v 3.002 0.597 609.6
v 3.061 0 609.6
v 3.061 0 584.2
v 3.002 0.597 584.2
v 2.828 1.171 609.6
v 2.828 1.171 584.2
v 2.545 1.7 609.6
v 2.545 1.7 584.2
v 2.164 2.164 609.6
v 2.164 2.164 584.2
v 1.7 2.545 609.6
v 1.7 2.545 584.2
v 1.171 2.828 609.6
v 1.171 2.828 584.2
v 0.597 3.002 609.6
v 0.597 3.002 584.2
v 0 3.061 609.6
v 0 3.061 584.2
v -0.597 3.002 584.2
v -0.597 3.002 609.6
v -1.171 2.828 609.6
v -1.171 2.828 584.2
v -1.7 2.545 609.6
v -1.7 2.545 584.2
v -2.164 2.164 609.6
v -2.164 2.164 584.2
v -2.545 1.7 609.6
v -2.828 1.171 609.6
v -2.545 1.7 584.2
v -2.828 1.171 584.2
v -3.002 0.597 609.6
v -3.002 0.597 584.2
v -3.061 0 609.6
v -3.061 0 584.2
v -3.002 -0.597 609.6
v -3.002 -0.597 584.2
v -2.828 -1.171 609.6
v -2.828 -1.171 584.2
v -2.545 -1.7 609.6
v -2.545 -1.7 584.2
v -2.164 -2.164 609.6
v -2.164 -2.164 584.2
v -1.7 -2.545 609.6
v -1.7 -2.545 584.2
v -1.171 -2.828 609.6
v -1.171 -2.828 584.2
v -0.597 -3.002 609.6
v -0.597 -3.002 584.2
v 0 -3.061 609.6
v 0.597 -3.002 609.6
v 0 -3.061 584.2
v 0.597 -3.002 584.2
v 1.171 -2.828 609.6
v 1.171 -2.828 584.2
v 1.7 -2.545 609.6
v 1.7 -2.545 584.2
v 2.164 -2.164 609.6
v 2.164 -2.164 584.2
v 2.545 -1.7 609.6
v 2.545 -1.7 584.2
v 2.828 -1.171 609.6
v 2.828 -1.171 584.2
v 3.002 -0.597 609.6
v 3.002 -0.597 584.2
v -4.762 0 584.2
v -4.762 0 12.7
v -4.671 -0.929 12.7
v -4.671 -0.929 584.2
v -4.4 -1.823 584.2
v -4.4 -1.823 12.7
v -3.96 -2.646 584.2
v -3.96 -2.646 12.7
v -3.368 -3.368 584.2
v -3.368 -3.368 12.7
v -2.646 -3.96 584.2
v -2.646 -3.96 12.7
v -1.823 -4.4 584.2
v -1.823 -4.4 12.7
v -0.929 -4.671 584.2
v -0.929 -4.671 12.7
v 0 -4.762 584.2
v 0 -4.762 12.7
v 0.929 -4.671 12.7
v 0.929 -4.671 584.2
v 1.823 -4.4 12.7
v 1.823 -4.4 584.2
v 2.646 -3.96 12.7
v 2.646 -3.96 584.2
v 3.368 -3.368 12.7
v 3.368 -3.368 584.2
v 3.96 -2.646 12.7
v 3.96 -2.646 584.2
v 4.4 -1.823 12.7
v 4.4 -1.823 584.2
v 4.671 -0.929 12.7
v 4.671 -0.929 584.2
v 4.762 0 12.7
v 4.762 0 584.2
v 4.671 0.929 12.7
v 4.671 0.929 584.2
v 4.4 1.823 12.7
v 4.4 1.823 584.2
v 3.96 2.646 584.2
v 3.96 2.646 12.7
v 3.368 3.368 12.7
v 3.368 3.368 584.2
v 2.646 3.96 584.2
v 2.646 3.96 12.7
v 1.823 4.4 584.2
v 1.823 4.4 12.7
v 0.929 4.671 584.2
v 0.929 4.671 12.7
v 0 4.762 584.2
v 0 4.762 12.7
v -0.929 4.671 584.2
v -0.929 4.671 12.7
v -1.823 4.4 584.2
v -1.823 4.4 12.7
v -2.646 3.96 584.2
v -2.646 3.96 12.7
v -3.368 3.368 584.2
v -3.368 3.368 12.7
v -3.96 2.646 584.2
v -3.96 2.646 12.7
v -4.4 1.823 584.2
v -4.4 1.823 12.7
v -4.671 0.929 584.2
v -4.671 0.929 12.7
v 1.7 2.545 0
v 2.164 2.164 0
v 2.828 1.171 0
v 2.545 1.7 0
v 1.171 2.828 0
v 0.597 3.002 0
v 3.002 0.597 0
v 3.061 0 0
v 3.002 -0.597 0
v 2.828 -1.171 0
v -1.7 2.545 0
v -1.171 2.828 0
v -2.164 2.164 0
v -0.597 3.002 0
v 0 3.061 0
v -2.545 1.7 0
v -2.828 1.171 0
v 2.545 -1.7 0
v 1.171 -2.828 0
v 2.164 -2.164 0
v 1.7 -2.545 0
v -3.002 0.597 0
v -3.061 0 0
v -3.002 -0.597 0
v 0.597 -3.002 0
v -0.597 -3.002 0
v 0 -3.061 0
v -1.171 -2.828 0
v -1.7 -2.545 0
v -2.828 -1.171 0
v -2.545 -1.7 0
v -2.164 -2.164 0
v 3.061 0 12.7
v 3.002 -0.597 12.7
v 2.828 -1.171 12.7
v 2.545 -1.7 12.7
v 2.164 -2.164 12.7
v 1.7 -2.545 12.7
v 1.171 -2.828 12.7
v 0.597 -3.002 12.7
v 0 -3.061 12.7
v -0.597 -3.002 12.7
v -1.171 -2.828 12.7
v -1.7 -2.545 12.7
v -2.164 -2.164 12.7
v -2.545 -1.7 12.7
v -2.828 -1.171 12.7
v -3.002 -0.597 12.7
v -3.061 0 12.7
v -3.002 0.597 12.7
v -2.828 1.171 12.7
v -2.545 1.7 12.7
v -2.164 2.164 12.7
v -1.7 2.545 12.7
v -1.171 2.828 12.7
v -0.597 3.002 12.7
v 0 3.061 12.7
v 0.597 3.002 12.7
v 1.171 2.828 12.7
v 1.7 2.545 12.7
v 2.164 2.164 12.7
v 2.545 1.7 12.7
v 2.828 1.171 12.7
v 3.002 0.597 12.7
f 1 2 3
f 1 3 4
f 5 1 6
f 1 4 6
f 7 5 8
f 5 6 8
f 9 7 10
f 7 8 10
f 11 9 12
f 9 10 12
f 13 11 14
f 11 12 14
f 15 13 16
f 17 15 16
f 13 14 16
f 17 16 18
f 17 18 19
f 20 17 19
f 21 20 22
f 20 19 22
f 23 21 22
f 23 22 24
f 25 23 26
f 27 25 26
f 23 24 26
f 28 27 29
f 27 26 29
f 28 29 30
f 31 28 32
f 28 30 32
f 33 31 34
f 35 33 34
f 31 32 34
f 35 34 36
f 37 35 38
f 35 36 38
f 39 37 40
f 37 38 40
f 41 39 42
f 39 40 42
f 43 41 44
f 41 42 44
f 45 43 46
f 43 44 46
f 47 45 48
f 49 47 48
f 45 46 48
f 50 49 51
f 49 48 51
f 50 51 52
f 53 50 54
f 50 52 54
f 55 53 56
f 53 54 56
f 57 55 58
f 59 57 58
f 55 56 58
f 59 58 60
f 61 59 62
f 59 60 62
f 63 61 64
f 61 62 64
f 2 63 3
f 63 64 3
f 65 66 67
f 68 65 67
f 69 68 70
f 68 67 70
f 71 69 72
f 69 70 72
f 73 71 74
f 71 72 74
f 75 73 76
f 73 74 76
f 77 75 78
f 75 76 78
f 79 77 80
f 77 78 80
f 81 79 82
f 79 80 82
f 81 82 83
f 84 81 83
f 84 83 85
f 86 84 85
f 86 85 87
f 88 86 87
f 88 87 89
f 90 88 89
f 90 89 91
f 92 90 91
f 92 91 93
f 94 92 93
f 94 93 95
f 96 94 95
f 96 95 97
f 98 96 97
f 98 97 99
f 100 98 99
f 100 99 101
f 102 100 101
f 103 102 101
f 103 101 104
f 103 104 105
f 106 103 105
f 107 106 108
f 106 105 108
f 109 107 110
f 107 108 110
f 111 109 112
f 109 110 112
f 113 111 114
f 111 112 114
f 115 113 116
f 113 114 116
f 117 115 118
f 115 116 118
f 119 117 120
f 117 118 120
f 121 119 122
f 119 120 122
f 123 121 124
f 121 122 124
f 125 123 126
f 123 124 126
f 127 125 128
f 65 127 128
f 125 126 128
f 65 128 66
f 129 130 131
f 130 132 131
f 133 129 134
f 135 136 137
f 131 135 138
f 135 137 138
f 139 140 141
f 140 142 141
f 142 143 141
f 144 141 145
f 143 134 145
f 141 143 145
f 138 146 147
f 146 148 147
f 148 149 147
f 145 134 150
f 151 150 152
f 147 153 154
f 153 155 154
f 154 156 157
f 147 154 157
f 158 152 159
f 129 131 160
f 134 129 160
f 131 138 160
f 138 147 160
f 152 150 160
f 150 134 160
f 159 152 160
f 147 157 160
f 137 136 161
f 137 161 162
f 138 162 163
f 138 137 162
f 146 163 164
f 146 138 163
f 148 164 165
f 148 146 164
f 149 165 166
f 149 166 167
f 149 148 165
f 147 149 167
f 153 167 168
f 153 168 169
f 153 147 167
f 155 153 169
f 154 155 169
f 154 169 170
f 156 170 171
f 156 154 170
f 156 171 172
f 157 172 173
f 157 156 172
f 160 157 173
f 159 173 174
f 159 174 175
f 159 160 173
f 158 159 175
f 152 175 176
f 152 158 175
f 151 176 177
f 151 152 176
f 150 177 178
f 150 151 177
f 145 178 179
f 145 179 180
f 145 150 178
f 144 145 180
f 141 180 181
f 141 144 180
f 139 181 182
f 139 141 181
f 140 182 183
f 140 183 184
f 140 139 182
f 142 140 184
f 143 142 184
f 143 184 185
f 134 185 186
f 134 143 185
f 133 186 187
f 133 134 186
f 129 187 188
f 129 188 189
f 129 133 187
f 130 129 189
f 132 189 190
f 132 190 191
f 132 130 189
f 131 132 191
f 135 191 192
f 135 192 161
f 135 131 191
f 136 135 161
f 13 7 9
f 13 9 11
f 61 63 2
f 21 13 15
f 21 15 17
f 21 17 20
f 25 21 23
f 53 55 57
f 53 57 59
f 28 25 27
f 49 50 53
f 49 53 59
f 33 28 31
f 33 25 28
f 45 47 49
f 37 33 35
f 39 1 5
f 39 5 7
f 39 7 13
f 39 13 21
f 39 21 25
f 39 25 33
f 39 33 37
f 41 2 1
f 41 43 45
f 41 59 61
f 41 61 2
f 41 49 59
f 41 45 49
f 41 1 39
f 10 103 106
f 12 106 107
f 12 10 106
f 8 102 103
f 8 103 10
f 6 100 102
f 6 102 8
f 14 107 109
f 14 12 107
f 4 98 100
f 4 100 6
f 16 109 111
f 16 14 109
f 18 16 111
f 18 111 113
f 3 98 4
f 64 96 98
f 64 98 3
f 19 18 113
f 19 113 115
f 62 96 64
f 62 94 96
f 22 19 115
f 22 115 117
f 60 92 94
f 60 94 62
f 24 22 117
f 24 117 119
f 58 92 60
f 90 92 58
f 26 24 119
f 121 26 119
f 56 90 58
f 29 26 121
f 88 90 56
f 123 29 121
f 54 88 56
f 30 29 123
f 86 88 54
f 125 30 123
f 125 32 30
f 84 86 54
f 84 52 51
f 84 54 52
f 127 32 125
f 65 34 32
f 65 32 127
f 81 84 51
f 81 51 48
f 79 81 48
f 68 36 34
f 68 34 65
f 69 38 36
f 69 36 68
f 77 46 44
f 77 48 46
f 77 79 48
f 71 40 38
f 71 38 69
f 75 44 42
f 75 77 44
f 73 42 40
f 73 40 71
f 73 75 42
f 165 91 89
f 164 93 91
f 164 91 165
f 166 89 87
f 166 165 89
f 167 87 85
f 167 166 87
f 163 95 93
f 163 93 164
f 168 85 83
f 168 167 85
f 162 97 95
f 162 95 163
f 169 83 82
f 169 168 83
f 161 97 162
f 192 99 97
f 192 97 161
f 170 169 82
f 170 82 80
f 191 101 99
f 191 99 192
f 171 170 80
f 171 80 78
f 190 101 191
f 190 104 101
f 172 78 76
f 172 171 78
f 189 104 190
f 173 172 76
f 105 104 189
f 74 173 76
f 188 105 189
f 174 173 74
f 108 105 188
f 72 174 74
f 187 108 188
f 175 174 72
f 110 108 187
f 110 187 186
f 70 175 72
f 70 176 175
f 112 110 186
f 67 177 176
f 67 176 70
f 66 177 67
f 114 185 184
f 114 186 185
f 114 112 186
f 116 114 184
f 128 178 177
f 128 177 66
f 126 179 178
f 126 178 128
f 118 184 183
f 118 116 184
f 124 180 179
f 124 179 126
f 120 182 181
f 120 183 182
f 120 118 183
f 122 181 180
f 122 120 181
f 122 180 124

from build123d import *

# Parameters (mm, degrees)
SKETCH1_R           = 4.7625
BOSS_EXTRUDE1_DEPTH = 609.6
CUT_EXTRUDE1_START  = -25.4
SKETCH2_R           = 4.7625
SKETCH2_R_2         = 3.0607
CUT_EXTRUDE1_DEPTH  = 25.4
SKETCH3_R           = 4.7625
SKETCH3_R_2         = 3.0607
CUT_EXTRUDE3_DEPTH  = 12.7


with BuildPart() as part:
    # Sketch1 → Boss-Extrude1 (new body)
    with BuildSketch(Plane.XY):
        with Locations(Location((0, 0, 0), (0, 0, 180))):
            Circle(SKETCH1_R)
    extrude(amount=BOSS_EXTRUDE1_DEPTH)

    # Sketch2 → Cut-Extrude1 (cut)
    with BuildSketch(Plane.XY.offset(609.6).offset(CUT_EXTRUDE1_START)):
        with Locations(Location((0, 0, 0), (0, 0, 180))):
            Circle(SKETCH2_R)
        Circle(SKETCH2_R_2, mode=Mode.SUBTRACT)
    extrude(amount=CUT_EXTRUDE1_DEPTH, mode=Mode.SUBTRACT)

    # Sketch3 → Cut-Extrude3 (cut)
    with BuildSketch(Plane(origin=(0, 0, 0), x_dir=(-1, 0, 0), z_dir=(0, 0, -1))):
        Circle(SKETCH3_R)
        with Locations(Location((0, 0, 0), (0, 0, 180))):
            Circle(SKETCH3_R_2, mode=Mode.SUBTRACT)
    extrude(amount=-CUT_EXTRUDE3_DEPTH, mode=Mode.SUBTRACT)


solid = part.part
